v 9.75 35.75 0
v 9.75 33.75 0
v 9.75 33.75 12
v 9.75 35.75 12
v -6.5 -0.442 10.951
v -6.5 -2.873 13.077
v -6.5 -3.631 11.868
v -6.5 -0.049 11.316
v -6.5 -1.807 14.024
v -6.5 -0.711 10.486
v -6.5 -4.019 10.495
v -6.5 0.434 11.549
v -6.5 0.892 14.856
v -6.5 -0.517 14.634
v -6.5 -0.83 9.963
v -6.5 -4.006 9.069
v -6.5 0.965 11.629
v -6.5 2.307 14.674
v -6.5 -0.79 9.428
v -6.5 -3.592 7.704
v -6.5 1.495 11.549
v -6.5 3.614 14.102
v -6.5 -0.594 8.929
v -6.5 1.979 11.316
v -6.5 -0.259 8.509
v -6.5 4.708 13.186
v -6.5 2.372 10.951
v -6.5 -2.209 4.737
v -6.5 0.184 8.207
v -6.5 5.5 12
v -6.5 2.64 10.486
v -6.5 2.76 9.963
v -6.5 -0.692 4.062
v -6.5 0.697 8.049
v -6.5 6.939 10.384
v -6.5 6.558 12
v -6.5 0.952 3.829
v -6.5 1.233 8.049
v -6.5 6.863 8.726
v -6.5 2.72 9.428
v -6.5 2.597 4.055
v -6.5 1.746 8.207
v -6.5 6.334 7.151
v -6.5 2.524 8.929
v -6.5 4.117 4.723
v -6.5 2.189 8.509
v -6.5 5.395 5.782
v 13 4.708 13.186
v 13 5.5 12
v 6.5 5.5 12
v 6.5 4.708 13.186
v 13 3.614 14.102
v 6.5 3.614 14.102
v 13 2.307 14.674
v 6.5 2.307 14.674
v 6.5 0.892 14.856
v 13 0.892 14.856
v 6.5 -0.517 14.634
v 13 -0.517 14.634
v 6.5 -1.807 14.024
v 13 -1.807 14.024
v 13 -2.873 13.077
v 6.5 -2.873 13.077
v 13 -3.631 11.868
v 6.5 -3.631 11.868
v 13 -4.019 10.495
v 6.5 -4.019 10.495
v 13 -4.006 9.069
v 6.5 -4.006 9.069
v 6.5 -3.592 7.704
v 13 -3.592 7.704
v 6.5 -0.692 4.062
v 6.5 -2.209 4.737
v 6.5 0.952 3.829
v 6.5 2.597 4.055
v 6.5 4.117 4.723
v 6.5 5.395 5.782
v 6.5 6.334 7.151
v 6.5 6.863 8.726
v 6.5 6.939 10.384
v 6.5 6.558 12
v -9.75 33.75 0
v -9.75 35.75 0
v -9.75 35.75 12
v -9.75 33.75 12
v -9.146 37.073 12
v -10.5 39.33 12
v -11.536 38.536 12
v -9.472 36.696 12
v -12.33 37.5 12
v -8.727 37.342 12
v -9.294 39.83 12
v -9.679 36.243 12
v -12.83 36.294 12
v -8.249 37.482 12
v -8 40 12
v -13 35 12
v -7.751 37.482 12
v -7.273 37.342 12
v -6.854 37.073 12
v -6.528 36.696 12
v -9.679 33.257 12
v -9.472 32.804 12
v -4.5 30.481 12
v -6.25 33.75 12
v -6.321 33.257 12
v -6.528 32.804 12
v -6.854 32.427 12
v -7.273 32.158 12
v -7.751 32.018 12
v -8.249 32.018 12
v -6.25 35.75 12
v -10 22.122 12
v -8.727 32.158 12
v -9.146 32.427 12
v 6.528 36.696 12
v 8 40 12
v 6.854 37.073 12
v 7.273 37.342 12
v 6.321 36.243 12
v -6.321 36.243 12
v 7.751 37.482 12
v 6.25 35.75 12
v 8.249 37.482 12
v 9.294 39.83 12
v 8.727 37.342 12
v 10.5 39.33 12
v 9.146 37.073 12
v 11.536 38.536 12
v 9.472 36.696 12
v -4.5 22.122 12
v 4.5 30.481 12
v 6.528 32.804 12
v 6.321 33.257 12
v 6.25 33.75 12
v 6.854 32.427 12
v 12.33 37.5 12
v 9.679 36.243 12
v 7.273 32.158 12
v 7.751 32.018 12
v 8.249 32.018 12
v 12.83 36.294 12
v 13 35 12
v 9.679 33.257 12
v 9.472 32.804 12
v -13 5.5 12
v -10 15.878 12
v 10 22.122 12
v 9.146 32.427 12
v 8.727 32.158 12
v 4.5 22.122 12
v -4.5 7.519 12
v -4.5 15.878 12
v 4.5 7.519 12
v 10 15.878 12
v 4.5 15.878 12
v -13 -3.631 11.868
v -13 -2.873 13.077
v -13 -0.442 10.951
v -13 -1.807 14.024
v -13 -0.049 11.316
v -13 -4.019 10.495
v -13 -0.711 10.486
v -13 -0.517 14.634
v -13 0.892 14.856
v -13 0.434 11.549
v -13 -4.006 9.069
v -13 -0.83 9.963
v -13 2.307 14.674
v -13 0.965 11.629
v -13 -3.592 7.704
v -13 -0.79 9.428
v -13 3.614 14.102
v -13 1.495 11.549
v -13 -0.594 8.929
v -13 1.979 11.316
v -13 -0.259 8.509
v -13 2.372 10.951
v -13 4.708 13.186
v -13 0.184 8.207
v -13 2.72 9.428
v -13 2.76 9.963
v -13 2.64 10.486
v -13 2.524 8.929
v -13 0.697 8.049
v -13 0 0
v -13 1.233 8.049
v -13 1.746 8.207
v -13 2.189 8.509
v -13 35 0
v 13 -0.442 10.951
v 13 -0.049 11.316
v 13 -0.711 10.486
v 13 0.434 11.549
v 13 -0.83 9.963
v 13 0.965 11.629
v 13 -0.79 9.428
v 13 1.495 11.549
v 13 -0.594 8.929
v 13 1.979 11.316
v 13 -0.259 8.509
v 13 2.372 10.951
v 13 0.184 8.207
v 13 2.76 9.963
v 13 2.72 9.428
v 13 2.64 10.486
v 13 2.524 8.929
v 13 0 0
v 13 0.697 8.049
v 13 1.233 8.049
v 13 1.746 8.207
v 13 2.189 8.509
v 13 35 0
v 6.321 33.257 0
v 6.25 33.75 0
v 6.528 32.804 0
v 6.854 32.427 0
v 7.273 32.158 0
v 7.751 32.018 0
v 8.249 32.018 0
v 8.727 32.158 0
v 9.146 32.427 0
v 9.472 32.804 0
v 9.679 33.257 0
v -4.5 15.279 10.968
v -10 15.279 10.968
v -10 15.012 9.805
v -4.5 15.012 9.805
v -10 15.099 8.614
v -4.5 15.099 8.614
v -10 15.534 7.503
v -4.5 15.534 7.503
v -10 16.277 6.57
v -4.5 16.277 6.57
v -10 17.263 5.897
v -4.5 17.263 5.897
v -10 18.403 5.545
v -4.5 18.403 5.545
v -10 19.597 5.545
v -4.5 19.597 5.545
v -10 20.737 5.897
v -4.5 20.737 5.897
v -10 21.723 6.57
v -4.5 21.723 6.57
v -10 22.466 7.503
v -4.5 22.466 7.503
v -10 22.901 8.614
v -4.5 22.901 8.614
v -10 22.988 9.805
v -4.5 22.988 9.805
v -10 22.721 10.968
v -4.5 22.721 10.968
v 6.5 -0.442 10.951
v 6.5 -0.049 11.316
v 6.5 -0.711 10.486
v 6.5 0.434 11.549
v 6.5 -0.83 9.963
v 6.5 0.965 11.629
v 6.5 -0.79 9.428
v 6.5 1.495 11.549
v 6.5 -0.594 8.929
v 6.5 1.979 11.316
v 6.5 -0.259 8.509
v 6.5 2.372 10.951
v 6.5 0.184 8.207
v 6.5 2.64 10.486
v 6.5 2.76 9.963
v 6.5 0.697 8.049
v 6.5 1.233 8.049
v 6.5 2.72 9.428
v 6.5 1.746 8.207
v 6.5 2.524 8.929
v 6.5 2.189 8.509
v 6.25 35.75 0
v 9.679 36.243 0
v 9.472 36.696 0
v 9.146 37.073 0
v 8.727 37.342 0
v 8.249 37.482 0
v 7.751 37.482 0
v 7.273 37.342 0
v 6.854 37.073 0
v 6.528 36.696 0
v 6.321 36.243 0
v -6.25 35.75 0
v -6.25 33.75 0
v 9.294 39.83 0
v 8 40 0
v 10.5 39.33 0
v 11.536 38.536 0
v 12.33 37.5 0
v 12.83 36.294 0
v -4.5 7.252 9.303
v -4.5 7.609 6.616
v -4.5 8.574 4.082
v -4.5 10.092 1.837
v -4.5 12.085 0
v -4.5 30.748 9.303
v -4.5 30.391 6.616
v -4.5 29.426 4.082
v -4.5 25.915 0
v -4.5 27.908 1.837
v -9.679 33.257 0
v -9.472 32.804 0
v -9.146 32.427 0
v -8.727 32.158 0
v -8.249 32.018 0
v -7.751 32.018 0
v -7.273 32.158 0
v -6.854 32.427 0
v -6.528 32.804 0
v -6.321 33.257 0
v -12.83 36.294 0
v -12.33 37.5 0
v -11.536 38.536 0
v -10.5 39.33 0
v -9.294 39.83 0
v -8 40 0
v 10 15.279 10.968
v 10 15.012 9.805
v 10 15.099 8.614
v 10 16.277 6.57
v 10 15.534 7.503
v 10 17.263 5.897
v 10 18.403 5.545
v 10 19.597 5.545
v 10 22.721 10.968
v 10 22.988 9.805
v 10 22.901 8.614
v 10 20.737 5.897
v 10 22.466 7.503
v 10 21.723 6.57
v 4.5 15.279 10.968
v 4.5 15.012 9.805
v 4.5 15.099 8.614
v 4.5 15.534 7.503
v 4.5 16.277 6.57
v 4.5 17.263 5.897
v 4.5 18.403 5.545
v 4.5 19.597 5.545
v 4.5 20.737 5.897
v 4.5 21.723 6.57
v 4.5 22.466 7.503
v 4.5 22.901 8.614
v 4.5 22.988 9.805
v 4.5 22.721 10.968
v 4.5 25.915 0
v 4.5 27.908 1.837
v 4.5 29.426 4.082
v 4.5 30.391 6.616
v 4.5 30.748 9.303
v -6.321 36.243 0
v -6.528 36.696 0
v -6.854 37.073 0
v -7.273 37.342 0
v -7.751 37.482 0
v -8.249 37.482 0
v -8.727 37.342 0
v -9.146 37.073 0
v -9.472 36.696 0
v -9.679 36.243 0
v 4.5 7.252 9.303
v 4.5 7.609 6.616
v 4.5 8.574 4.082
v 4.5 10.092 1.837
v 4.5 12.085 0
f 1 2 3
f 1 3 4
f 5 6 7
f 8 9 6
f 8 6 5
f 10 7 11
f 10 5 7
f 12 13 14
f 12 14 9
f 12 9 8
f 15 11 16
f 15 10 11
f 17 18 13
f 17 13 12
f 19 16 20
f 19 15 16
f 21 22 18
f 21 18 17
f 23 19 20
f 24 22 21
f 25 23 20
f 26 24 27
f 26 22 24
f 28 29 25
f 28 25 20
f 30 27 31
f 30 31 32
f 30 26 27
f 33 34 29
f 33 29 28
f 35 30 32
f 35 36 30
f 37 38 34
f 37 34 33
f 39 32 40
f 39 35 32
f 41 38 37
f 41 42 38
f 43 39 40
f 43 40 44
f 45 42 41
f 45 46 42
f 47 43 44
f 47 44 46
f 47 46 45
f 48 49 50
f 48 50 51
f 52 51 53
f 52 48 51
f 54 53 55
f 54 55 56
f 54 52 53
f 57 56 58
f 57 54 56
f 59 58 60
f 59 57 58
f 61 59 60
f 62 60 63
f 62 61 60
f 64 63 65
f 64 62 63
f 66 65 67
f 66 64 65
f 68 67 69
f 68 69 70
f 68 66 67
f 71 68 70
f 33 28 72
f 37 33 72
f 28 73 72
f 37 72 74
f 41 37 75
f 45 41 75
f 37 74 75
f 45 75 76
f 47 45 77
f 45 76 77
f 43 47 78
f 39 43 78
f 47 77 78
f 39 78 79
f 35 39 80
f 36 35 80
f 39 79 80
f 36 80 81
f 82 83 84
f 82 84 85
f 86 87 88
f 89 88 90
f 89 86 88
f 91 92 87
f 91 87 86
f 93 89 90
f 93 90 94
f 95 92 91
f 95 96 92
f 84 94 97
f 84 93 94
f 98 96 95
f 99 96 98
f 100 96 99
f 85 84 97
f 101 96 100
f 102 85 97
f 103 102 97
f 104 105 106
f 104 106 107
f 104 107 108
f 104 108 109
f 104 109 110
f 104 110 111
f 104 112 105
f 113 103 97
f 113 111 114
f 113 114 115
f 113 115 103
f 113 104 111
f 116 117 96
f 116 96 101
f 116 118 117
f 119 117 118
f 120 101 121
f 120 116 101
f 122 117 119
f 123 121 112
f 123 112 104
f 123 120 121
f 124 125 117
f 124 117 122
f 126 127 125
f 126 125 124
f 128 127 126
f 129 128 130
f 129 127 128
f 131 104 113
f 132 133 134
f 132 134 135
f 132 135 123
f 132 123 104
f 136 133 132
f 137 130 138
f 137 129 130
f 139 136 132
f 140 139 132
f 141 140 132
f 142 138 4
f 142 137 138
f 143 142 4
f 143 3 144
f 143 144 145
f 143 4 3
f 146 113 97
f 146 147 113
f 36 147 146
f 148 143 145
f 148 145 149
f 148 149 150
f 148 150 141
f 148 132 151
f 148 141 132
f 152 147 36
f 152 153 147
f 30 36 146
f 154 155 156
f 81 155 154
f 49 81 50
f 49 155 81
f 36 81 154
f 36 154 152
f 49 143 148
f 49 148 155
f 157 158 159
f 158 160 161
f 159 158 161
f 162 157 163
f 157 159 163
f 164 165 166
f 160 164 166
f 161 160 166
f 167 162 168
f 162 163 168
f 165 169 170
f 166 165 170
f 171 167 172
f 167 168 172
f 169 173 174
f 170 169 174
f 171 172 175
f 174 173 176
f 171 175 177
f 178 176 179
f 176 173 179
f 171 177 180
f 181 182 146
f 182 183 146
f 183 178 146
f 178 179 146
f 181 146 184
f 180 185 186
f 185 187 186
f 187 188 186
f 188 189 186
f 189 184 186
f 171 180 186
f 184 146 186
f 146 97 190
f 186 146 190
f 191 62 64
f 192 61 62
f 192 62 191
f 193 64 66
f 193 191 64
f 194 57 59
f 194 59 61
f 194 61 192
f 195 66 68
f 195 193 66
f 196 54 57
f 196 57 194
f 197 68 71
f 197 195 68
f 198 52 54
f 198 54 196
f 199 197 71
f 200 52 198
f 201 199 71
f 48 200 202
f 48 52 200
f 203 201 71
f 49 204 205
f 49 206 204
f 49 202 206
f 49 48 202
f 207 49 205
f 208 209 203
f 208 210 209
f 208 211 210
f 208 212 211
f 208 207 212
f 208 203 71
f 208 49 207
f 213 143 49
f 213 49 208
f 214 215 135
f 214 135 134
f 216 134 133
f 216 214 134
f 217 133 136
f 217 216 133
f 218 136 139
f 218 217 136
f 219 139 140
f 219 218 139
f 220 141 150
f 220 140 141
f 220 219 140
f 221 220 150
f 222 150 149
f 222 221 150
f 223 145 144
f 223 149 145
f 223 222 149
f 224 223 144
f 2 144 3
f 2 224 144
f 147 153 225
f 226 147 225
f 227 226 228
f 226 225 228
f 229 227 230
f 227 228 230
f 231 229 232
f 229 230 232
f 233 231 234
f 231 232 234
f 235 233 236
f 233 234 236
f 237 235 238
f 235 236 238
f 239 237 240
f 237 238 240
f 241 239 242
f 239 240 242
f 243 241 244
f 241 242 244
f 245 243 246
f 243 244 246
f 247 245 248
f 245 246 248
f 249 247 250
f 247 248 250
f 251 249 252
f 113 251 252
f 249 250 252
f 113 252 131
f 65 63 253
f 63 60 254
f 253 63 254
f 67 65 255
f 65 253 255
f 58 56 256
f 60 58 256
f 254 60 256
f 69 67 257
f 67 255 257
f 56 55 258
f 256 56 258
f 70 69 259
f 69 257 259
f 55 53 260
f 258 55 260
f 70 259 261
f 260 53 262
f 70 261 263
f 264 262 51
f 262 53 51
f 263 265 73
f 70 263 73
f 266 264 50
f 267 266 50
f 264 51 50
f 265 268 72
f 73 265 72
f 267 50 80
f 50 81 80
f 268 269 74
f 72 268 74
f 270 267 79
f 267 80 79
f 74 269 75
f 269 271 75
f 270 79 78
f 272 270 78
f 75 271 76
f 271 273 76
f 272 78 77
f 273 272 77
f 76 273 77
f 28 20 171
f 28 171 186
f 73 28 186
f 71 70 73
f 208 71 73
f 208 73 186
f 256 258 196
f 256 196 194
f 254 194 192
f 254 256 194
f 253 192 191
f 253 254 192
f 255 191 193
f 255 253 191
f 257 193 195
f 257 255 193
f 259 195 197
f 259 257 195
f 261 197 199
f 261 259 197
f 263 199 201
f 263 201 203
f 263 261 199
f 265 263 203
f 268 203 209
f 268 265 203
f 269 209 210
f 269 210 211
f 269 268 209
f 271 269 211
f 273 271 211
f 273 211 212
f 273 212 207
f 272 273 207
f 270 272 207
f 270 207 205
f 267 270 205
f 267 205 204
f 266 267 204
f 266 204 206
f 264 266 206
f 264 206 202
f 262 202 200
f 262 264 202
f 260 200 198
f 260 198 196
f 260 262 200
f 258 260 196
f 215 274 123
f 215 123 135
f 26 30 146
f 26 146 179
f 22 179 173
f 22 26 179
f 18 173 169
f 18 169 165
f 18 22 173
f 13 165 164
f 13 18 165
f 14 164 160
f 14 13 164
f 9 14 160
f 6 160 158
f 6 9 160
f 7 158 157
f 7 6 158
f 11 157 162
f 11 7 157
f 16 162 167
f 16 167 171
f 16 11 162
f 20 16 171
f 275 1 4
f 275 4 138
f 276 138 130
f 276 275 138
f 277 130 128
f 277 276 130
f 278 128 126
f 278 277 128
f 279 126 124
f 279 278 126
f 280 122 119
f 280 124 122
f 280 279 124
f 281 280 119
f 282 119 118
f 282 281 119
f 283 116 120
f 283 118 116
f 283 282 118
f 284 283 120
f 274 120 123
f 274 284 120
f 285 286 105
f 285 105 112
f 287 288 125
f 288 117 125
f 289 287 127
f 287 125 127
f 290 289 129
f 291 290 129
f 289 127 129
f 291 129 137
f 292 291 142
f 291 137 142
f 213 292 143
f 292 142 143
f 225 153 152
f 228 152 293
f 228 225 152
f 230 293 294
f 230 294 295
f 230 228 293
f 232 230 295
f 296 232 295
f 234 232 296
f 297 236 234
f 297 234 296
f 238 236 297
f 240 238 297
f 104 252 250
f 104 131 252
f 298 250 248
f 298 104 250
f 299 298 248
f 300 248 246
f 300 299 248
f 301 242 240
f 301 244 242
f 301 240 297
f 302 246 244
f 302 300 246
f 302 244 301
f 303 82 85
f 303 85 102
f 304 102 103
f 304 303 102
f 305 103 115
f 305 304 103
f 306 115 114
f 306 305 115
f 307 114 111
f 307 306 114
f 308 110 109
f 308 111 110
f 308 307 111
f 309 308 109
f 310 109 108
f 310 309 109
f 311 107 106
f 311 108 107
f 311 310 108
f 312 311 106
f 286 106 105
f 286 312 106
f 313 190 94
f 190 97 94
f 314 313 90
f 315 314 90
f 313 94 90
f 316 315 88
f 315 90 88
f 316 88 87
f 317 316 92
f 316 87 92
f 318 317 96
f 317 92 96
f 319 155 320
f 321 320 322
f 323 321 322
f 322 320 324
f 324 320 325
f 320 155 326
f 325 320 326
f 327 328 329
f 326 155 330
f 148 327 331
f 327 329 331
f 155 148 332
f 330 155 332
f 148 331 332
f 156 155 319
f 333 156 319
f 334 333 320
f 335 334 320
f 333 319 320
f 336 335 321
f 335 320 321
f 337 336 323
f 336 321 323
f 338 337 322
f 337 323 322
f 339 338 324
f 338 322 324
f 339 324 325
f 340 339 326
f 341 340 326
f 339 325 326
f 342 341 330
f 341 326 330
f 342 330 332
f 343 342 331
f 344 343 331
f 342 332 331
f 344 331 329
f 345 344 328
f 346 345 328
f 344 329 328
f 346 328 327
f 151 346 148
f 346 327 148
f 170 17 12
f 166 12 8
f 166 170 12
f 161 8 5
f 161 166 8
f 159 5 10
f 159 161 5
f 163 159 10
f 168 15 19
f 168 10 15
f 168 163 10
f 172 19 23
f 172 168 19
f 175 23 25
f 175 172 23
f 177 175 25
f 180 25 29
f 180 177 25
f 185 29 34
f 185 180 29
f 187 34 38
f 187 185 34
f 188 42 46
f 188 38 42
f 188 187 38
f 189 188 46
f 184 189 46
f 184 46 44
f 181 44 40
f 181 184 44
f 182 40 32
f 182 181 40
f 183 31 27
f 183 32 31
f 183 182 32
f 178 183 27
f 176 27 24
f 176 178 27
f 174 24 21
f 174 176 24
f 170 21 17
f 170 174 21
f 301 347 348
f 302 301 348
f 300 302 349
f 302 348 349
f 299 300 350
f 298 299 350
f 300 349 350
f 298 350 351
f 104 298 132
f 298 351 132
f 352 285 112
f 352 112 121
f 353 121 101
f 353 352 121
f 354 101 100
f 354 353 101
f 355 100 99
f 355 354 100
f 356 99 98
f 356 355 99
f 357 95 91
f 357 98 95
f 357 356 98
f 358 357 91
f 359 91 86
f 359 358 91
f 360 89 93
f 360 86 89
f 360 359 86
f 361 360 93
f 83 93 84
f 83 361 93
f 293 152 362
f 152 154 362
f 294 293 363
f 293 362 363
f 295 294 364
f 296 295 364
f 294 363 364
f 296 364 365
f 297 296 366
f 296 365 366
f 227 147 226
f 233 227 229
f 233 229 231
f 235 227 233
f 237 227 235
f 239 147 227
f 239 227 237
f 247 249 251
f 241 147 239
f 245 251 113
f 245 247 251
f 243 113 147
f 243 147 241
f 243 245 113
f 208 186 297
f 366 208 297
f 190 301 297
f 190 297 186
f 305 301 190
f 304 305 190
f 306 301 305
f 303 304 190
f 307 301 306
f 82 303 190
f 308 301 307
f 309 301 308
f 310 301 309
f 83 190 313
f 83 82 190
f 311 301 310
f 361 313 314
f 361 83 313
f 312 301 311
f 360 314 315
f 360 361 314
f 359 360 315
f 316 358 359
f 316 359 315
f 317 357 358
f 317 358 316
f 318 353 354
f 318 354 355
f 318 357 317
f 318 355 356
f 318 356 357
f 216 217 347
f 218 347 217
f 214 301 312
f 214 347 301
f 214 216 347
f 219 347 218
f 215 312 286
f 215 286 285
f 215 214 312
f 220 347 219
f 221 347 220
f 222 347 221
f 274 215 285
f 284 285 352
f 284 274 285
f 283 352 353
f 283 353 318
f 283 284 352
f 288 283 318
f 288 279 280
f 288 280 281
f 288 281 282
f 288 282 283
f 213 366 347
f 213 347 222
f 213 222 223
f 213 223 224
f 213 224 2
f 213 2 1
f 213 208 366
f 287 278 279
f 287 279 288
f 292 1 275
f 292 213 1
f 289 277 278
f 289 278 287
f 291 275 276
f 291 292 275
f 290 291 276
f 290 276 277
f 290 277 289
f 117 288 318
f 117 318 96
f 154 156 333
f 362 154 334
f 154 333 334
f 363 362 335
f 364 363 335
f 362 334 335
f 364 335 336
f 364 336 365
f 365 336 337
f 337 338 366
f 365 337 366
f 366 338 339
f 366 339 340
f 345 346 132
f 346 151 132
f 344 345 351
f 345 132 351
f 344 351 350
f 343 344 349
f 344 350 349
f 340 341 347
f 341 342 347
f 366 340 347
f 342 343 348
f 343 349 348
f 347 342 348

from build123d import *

# Parameters (mm, degrees)
SKETCH1_R           = 1.8
BOSS_EXTRUDE1_DEPTH = 13
SKETCH2_R           = 4
CUT_EXTRUDE1_DEPTH  = 10
SKETCH3_R           = 11.75
CUT_EXTRUDE2_DEPTH  = 4.5
SKETCH4_R           = 6
CUT_EXTRUDE3_DEPTH  = 6.5
CUT_EXTRUDE6_DEPTH  = 45.606330279
FILLET1_R           = 5


with BuildPart() as part:
    # Sketch1 → Boss-Extrude1 (new, symmetric)
    with BuildSketch(Plane(origin=(0, 0, 0), x_dir=(0, 0, -1), z_dir=(1, 0, 0))):
        with BuildLine():
            Line((0, 0), (0, 40))
            Line((0, 40), (-12, 40))
            Line((-12, 40), (-12, 5.5))
            ThreePointArc((-12, 5.5), (-14.374806505, -1.183390223), (-7.70361619, -3.592255225))
            Line((-7.70361619, -3.592255225), (0, 0))
        make_face()
        with Locations(Location((-9.828619755, 0.964829626, 0), (0, 0, 180))):
            Circle(SKETCH1_R, mode=Mode.SUBTRACT)
    extrude(amount=BOSS_EXTRUDE1_DEPTH, both=True)

    # Sketch2 → Cut-Extrude1 (cut, symmetric)
    with BuildSketch(Plane(origin=(0, 0, 0), x_dir=(0, 0, -1), z_dir=(1, 0, 0))):
        with Locations((-9.5, 19)):
            Circle(SKETCH2_R)
    extrude(amount=CUT_EXTRUDE1_DEPTH, both=True, mode=Mode.SUBTRACT)

    # Sketch3 → Cut-Extrude2 (cut, symmetric)
    with BuildSketch(Plane(origin=(0, 0, 0), x_dir=(0, 0, -1), z_dir=(1, 0, 0))):
        with Locations((-9.5, 19)):
            Circle(SKETCH3_R)
    extrude(amount=CUT_EXTRUDE2_DEPTH, both=True, mode=Mode.SUBTRACT)

    # Sketch4 → Cut-Extrude3 (cut, symmetric)
    with BuildSketch(Plane(origin=(0, 0, 0), x_dir=(0, 0, -1), z_dir=(1, 0, 0))):
        with Locations((-9.828619755, 0.964829626)):
            Circle(SKETCH4_R)
    extrude(amount=CUT_EXTRUDE3_DEPTH, both=True, mode=Mode.SUBTRACT)

    # Sketch7 → Cut-Extrude6 (cut, through all)
    with BuildSketch(Plane(origin=(0, 0, 0), x_dir=(-1, 0, 0), z_dir=(0, 0, -1))):
        with BuildLine():
            Line((-6.25, 35.75), (-6.25, 33.75))
            ThreePointArc((-6.25, 33.75), (-8, 32), (-9.75, 33.75))
            Line((-9.75, 33.75), (-9.75, 35.75))
            ThreePointArc((-9.75, 35.75), (-8, 37.5), (-6.25, 35.75))
        make_face()
        with BuildLine():
            Line((9.75, 35.75), (9.75, 33.75))
            ThreePointArc((9.75, 33.75), (8, 32), (6.25, 33.75))
            Line((6.25, 33.75), (6.25, 35.75))
            ThreePointArc((6.25, 35.75), (8, 37.5), (9.75, 35.75))
        make_face()
    extrude(amount=-CUT_EXTRUDE6_DEPTH, mode=Mode.SUBTRACT)

    # Fillet1
    fillet1_edges = [part.edges().sort_by_distance(p)[0] for p in [
        (13, 40, 6),
        (-13, 40, 6),
    ]]
    fillet(fillet1_edges, radius=FILLET1_R)


solid = part.part
